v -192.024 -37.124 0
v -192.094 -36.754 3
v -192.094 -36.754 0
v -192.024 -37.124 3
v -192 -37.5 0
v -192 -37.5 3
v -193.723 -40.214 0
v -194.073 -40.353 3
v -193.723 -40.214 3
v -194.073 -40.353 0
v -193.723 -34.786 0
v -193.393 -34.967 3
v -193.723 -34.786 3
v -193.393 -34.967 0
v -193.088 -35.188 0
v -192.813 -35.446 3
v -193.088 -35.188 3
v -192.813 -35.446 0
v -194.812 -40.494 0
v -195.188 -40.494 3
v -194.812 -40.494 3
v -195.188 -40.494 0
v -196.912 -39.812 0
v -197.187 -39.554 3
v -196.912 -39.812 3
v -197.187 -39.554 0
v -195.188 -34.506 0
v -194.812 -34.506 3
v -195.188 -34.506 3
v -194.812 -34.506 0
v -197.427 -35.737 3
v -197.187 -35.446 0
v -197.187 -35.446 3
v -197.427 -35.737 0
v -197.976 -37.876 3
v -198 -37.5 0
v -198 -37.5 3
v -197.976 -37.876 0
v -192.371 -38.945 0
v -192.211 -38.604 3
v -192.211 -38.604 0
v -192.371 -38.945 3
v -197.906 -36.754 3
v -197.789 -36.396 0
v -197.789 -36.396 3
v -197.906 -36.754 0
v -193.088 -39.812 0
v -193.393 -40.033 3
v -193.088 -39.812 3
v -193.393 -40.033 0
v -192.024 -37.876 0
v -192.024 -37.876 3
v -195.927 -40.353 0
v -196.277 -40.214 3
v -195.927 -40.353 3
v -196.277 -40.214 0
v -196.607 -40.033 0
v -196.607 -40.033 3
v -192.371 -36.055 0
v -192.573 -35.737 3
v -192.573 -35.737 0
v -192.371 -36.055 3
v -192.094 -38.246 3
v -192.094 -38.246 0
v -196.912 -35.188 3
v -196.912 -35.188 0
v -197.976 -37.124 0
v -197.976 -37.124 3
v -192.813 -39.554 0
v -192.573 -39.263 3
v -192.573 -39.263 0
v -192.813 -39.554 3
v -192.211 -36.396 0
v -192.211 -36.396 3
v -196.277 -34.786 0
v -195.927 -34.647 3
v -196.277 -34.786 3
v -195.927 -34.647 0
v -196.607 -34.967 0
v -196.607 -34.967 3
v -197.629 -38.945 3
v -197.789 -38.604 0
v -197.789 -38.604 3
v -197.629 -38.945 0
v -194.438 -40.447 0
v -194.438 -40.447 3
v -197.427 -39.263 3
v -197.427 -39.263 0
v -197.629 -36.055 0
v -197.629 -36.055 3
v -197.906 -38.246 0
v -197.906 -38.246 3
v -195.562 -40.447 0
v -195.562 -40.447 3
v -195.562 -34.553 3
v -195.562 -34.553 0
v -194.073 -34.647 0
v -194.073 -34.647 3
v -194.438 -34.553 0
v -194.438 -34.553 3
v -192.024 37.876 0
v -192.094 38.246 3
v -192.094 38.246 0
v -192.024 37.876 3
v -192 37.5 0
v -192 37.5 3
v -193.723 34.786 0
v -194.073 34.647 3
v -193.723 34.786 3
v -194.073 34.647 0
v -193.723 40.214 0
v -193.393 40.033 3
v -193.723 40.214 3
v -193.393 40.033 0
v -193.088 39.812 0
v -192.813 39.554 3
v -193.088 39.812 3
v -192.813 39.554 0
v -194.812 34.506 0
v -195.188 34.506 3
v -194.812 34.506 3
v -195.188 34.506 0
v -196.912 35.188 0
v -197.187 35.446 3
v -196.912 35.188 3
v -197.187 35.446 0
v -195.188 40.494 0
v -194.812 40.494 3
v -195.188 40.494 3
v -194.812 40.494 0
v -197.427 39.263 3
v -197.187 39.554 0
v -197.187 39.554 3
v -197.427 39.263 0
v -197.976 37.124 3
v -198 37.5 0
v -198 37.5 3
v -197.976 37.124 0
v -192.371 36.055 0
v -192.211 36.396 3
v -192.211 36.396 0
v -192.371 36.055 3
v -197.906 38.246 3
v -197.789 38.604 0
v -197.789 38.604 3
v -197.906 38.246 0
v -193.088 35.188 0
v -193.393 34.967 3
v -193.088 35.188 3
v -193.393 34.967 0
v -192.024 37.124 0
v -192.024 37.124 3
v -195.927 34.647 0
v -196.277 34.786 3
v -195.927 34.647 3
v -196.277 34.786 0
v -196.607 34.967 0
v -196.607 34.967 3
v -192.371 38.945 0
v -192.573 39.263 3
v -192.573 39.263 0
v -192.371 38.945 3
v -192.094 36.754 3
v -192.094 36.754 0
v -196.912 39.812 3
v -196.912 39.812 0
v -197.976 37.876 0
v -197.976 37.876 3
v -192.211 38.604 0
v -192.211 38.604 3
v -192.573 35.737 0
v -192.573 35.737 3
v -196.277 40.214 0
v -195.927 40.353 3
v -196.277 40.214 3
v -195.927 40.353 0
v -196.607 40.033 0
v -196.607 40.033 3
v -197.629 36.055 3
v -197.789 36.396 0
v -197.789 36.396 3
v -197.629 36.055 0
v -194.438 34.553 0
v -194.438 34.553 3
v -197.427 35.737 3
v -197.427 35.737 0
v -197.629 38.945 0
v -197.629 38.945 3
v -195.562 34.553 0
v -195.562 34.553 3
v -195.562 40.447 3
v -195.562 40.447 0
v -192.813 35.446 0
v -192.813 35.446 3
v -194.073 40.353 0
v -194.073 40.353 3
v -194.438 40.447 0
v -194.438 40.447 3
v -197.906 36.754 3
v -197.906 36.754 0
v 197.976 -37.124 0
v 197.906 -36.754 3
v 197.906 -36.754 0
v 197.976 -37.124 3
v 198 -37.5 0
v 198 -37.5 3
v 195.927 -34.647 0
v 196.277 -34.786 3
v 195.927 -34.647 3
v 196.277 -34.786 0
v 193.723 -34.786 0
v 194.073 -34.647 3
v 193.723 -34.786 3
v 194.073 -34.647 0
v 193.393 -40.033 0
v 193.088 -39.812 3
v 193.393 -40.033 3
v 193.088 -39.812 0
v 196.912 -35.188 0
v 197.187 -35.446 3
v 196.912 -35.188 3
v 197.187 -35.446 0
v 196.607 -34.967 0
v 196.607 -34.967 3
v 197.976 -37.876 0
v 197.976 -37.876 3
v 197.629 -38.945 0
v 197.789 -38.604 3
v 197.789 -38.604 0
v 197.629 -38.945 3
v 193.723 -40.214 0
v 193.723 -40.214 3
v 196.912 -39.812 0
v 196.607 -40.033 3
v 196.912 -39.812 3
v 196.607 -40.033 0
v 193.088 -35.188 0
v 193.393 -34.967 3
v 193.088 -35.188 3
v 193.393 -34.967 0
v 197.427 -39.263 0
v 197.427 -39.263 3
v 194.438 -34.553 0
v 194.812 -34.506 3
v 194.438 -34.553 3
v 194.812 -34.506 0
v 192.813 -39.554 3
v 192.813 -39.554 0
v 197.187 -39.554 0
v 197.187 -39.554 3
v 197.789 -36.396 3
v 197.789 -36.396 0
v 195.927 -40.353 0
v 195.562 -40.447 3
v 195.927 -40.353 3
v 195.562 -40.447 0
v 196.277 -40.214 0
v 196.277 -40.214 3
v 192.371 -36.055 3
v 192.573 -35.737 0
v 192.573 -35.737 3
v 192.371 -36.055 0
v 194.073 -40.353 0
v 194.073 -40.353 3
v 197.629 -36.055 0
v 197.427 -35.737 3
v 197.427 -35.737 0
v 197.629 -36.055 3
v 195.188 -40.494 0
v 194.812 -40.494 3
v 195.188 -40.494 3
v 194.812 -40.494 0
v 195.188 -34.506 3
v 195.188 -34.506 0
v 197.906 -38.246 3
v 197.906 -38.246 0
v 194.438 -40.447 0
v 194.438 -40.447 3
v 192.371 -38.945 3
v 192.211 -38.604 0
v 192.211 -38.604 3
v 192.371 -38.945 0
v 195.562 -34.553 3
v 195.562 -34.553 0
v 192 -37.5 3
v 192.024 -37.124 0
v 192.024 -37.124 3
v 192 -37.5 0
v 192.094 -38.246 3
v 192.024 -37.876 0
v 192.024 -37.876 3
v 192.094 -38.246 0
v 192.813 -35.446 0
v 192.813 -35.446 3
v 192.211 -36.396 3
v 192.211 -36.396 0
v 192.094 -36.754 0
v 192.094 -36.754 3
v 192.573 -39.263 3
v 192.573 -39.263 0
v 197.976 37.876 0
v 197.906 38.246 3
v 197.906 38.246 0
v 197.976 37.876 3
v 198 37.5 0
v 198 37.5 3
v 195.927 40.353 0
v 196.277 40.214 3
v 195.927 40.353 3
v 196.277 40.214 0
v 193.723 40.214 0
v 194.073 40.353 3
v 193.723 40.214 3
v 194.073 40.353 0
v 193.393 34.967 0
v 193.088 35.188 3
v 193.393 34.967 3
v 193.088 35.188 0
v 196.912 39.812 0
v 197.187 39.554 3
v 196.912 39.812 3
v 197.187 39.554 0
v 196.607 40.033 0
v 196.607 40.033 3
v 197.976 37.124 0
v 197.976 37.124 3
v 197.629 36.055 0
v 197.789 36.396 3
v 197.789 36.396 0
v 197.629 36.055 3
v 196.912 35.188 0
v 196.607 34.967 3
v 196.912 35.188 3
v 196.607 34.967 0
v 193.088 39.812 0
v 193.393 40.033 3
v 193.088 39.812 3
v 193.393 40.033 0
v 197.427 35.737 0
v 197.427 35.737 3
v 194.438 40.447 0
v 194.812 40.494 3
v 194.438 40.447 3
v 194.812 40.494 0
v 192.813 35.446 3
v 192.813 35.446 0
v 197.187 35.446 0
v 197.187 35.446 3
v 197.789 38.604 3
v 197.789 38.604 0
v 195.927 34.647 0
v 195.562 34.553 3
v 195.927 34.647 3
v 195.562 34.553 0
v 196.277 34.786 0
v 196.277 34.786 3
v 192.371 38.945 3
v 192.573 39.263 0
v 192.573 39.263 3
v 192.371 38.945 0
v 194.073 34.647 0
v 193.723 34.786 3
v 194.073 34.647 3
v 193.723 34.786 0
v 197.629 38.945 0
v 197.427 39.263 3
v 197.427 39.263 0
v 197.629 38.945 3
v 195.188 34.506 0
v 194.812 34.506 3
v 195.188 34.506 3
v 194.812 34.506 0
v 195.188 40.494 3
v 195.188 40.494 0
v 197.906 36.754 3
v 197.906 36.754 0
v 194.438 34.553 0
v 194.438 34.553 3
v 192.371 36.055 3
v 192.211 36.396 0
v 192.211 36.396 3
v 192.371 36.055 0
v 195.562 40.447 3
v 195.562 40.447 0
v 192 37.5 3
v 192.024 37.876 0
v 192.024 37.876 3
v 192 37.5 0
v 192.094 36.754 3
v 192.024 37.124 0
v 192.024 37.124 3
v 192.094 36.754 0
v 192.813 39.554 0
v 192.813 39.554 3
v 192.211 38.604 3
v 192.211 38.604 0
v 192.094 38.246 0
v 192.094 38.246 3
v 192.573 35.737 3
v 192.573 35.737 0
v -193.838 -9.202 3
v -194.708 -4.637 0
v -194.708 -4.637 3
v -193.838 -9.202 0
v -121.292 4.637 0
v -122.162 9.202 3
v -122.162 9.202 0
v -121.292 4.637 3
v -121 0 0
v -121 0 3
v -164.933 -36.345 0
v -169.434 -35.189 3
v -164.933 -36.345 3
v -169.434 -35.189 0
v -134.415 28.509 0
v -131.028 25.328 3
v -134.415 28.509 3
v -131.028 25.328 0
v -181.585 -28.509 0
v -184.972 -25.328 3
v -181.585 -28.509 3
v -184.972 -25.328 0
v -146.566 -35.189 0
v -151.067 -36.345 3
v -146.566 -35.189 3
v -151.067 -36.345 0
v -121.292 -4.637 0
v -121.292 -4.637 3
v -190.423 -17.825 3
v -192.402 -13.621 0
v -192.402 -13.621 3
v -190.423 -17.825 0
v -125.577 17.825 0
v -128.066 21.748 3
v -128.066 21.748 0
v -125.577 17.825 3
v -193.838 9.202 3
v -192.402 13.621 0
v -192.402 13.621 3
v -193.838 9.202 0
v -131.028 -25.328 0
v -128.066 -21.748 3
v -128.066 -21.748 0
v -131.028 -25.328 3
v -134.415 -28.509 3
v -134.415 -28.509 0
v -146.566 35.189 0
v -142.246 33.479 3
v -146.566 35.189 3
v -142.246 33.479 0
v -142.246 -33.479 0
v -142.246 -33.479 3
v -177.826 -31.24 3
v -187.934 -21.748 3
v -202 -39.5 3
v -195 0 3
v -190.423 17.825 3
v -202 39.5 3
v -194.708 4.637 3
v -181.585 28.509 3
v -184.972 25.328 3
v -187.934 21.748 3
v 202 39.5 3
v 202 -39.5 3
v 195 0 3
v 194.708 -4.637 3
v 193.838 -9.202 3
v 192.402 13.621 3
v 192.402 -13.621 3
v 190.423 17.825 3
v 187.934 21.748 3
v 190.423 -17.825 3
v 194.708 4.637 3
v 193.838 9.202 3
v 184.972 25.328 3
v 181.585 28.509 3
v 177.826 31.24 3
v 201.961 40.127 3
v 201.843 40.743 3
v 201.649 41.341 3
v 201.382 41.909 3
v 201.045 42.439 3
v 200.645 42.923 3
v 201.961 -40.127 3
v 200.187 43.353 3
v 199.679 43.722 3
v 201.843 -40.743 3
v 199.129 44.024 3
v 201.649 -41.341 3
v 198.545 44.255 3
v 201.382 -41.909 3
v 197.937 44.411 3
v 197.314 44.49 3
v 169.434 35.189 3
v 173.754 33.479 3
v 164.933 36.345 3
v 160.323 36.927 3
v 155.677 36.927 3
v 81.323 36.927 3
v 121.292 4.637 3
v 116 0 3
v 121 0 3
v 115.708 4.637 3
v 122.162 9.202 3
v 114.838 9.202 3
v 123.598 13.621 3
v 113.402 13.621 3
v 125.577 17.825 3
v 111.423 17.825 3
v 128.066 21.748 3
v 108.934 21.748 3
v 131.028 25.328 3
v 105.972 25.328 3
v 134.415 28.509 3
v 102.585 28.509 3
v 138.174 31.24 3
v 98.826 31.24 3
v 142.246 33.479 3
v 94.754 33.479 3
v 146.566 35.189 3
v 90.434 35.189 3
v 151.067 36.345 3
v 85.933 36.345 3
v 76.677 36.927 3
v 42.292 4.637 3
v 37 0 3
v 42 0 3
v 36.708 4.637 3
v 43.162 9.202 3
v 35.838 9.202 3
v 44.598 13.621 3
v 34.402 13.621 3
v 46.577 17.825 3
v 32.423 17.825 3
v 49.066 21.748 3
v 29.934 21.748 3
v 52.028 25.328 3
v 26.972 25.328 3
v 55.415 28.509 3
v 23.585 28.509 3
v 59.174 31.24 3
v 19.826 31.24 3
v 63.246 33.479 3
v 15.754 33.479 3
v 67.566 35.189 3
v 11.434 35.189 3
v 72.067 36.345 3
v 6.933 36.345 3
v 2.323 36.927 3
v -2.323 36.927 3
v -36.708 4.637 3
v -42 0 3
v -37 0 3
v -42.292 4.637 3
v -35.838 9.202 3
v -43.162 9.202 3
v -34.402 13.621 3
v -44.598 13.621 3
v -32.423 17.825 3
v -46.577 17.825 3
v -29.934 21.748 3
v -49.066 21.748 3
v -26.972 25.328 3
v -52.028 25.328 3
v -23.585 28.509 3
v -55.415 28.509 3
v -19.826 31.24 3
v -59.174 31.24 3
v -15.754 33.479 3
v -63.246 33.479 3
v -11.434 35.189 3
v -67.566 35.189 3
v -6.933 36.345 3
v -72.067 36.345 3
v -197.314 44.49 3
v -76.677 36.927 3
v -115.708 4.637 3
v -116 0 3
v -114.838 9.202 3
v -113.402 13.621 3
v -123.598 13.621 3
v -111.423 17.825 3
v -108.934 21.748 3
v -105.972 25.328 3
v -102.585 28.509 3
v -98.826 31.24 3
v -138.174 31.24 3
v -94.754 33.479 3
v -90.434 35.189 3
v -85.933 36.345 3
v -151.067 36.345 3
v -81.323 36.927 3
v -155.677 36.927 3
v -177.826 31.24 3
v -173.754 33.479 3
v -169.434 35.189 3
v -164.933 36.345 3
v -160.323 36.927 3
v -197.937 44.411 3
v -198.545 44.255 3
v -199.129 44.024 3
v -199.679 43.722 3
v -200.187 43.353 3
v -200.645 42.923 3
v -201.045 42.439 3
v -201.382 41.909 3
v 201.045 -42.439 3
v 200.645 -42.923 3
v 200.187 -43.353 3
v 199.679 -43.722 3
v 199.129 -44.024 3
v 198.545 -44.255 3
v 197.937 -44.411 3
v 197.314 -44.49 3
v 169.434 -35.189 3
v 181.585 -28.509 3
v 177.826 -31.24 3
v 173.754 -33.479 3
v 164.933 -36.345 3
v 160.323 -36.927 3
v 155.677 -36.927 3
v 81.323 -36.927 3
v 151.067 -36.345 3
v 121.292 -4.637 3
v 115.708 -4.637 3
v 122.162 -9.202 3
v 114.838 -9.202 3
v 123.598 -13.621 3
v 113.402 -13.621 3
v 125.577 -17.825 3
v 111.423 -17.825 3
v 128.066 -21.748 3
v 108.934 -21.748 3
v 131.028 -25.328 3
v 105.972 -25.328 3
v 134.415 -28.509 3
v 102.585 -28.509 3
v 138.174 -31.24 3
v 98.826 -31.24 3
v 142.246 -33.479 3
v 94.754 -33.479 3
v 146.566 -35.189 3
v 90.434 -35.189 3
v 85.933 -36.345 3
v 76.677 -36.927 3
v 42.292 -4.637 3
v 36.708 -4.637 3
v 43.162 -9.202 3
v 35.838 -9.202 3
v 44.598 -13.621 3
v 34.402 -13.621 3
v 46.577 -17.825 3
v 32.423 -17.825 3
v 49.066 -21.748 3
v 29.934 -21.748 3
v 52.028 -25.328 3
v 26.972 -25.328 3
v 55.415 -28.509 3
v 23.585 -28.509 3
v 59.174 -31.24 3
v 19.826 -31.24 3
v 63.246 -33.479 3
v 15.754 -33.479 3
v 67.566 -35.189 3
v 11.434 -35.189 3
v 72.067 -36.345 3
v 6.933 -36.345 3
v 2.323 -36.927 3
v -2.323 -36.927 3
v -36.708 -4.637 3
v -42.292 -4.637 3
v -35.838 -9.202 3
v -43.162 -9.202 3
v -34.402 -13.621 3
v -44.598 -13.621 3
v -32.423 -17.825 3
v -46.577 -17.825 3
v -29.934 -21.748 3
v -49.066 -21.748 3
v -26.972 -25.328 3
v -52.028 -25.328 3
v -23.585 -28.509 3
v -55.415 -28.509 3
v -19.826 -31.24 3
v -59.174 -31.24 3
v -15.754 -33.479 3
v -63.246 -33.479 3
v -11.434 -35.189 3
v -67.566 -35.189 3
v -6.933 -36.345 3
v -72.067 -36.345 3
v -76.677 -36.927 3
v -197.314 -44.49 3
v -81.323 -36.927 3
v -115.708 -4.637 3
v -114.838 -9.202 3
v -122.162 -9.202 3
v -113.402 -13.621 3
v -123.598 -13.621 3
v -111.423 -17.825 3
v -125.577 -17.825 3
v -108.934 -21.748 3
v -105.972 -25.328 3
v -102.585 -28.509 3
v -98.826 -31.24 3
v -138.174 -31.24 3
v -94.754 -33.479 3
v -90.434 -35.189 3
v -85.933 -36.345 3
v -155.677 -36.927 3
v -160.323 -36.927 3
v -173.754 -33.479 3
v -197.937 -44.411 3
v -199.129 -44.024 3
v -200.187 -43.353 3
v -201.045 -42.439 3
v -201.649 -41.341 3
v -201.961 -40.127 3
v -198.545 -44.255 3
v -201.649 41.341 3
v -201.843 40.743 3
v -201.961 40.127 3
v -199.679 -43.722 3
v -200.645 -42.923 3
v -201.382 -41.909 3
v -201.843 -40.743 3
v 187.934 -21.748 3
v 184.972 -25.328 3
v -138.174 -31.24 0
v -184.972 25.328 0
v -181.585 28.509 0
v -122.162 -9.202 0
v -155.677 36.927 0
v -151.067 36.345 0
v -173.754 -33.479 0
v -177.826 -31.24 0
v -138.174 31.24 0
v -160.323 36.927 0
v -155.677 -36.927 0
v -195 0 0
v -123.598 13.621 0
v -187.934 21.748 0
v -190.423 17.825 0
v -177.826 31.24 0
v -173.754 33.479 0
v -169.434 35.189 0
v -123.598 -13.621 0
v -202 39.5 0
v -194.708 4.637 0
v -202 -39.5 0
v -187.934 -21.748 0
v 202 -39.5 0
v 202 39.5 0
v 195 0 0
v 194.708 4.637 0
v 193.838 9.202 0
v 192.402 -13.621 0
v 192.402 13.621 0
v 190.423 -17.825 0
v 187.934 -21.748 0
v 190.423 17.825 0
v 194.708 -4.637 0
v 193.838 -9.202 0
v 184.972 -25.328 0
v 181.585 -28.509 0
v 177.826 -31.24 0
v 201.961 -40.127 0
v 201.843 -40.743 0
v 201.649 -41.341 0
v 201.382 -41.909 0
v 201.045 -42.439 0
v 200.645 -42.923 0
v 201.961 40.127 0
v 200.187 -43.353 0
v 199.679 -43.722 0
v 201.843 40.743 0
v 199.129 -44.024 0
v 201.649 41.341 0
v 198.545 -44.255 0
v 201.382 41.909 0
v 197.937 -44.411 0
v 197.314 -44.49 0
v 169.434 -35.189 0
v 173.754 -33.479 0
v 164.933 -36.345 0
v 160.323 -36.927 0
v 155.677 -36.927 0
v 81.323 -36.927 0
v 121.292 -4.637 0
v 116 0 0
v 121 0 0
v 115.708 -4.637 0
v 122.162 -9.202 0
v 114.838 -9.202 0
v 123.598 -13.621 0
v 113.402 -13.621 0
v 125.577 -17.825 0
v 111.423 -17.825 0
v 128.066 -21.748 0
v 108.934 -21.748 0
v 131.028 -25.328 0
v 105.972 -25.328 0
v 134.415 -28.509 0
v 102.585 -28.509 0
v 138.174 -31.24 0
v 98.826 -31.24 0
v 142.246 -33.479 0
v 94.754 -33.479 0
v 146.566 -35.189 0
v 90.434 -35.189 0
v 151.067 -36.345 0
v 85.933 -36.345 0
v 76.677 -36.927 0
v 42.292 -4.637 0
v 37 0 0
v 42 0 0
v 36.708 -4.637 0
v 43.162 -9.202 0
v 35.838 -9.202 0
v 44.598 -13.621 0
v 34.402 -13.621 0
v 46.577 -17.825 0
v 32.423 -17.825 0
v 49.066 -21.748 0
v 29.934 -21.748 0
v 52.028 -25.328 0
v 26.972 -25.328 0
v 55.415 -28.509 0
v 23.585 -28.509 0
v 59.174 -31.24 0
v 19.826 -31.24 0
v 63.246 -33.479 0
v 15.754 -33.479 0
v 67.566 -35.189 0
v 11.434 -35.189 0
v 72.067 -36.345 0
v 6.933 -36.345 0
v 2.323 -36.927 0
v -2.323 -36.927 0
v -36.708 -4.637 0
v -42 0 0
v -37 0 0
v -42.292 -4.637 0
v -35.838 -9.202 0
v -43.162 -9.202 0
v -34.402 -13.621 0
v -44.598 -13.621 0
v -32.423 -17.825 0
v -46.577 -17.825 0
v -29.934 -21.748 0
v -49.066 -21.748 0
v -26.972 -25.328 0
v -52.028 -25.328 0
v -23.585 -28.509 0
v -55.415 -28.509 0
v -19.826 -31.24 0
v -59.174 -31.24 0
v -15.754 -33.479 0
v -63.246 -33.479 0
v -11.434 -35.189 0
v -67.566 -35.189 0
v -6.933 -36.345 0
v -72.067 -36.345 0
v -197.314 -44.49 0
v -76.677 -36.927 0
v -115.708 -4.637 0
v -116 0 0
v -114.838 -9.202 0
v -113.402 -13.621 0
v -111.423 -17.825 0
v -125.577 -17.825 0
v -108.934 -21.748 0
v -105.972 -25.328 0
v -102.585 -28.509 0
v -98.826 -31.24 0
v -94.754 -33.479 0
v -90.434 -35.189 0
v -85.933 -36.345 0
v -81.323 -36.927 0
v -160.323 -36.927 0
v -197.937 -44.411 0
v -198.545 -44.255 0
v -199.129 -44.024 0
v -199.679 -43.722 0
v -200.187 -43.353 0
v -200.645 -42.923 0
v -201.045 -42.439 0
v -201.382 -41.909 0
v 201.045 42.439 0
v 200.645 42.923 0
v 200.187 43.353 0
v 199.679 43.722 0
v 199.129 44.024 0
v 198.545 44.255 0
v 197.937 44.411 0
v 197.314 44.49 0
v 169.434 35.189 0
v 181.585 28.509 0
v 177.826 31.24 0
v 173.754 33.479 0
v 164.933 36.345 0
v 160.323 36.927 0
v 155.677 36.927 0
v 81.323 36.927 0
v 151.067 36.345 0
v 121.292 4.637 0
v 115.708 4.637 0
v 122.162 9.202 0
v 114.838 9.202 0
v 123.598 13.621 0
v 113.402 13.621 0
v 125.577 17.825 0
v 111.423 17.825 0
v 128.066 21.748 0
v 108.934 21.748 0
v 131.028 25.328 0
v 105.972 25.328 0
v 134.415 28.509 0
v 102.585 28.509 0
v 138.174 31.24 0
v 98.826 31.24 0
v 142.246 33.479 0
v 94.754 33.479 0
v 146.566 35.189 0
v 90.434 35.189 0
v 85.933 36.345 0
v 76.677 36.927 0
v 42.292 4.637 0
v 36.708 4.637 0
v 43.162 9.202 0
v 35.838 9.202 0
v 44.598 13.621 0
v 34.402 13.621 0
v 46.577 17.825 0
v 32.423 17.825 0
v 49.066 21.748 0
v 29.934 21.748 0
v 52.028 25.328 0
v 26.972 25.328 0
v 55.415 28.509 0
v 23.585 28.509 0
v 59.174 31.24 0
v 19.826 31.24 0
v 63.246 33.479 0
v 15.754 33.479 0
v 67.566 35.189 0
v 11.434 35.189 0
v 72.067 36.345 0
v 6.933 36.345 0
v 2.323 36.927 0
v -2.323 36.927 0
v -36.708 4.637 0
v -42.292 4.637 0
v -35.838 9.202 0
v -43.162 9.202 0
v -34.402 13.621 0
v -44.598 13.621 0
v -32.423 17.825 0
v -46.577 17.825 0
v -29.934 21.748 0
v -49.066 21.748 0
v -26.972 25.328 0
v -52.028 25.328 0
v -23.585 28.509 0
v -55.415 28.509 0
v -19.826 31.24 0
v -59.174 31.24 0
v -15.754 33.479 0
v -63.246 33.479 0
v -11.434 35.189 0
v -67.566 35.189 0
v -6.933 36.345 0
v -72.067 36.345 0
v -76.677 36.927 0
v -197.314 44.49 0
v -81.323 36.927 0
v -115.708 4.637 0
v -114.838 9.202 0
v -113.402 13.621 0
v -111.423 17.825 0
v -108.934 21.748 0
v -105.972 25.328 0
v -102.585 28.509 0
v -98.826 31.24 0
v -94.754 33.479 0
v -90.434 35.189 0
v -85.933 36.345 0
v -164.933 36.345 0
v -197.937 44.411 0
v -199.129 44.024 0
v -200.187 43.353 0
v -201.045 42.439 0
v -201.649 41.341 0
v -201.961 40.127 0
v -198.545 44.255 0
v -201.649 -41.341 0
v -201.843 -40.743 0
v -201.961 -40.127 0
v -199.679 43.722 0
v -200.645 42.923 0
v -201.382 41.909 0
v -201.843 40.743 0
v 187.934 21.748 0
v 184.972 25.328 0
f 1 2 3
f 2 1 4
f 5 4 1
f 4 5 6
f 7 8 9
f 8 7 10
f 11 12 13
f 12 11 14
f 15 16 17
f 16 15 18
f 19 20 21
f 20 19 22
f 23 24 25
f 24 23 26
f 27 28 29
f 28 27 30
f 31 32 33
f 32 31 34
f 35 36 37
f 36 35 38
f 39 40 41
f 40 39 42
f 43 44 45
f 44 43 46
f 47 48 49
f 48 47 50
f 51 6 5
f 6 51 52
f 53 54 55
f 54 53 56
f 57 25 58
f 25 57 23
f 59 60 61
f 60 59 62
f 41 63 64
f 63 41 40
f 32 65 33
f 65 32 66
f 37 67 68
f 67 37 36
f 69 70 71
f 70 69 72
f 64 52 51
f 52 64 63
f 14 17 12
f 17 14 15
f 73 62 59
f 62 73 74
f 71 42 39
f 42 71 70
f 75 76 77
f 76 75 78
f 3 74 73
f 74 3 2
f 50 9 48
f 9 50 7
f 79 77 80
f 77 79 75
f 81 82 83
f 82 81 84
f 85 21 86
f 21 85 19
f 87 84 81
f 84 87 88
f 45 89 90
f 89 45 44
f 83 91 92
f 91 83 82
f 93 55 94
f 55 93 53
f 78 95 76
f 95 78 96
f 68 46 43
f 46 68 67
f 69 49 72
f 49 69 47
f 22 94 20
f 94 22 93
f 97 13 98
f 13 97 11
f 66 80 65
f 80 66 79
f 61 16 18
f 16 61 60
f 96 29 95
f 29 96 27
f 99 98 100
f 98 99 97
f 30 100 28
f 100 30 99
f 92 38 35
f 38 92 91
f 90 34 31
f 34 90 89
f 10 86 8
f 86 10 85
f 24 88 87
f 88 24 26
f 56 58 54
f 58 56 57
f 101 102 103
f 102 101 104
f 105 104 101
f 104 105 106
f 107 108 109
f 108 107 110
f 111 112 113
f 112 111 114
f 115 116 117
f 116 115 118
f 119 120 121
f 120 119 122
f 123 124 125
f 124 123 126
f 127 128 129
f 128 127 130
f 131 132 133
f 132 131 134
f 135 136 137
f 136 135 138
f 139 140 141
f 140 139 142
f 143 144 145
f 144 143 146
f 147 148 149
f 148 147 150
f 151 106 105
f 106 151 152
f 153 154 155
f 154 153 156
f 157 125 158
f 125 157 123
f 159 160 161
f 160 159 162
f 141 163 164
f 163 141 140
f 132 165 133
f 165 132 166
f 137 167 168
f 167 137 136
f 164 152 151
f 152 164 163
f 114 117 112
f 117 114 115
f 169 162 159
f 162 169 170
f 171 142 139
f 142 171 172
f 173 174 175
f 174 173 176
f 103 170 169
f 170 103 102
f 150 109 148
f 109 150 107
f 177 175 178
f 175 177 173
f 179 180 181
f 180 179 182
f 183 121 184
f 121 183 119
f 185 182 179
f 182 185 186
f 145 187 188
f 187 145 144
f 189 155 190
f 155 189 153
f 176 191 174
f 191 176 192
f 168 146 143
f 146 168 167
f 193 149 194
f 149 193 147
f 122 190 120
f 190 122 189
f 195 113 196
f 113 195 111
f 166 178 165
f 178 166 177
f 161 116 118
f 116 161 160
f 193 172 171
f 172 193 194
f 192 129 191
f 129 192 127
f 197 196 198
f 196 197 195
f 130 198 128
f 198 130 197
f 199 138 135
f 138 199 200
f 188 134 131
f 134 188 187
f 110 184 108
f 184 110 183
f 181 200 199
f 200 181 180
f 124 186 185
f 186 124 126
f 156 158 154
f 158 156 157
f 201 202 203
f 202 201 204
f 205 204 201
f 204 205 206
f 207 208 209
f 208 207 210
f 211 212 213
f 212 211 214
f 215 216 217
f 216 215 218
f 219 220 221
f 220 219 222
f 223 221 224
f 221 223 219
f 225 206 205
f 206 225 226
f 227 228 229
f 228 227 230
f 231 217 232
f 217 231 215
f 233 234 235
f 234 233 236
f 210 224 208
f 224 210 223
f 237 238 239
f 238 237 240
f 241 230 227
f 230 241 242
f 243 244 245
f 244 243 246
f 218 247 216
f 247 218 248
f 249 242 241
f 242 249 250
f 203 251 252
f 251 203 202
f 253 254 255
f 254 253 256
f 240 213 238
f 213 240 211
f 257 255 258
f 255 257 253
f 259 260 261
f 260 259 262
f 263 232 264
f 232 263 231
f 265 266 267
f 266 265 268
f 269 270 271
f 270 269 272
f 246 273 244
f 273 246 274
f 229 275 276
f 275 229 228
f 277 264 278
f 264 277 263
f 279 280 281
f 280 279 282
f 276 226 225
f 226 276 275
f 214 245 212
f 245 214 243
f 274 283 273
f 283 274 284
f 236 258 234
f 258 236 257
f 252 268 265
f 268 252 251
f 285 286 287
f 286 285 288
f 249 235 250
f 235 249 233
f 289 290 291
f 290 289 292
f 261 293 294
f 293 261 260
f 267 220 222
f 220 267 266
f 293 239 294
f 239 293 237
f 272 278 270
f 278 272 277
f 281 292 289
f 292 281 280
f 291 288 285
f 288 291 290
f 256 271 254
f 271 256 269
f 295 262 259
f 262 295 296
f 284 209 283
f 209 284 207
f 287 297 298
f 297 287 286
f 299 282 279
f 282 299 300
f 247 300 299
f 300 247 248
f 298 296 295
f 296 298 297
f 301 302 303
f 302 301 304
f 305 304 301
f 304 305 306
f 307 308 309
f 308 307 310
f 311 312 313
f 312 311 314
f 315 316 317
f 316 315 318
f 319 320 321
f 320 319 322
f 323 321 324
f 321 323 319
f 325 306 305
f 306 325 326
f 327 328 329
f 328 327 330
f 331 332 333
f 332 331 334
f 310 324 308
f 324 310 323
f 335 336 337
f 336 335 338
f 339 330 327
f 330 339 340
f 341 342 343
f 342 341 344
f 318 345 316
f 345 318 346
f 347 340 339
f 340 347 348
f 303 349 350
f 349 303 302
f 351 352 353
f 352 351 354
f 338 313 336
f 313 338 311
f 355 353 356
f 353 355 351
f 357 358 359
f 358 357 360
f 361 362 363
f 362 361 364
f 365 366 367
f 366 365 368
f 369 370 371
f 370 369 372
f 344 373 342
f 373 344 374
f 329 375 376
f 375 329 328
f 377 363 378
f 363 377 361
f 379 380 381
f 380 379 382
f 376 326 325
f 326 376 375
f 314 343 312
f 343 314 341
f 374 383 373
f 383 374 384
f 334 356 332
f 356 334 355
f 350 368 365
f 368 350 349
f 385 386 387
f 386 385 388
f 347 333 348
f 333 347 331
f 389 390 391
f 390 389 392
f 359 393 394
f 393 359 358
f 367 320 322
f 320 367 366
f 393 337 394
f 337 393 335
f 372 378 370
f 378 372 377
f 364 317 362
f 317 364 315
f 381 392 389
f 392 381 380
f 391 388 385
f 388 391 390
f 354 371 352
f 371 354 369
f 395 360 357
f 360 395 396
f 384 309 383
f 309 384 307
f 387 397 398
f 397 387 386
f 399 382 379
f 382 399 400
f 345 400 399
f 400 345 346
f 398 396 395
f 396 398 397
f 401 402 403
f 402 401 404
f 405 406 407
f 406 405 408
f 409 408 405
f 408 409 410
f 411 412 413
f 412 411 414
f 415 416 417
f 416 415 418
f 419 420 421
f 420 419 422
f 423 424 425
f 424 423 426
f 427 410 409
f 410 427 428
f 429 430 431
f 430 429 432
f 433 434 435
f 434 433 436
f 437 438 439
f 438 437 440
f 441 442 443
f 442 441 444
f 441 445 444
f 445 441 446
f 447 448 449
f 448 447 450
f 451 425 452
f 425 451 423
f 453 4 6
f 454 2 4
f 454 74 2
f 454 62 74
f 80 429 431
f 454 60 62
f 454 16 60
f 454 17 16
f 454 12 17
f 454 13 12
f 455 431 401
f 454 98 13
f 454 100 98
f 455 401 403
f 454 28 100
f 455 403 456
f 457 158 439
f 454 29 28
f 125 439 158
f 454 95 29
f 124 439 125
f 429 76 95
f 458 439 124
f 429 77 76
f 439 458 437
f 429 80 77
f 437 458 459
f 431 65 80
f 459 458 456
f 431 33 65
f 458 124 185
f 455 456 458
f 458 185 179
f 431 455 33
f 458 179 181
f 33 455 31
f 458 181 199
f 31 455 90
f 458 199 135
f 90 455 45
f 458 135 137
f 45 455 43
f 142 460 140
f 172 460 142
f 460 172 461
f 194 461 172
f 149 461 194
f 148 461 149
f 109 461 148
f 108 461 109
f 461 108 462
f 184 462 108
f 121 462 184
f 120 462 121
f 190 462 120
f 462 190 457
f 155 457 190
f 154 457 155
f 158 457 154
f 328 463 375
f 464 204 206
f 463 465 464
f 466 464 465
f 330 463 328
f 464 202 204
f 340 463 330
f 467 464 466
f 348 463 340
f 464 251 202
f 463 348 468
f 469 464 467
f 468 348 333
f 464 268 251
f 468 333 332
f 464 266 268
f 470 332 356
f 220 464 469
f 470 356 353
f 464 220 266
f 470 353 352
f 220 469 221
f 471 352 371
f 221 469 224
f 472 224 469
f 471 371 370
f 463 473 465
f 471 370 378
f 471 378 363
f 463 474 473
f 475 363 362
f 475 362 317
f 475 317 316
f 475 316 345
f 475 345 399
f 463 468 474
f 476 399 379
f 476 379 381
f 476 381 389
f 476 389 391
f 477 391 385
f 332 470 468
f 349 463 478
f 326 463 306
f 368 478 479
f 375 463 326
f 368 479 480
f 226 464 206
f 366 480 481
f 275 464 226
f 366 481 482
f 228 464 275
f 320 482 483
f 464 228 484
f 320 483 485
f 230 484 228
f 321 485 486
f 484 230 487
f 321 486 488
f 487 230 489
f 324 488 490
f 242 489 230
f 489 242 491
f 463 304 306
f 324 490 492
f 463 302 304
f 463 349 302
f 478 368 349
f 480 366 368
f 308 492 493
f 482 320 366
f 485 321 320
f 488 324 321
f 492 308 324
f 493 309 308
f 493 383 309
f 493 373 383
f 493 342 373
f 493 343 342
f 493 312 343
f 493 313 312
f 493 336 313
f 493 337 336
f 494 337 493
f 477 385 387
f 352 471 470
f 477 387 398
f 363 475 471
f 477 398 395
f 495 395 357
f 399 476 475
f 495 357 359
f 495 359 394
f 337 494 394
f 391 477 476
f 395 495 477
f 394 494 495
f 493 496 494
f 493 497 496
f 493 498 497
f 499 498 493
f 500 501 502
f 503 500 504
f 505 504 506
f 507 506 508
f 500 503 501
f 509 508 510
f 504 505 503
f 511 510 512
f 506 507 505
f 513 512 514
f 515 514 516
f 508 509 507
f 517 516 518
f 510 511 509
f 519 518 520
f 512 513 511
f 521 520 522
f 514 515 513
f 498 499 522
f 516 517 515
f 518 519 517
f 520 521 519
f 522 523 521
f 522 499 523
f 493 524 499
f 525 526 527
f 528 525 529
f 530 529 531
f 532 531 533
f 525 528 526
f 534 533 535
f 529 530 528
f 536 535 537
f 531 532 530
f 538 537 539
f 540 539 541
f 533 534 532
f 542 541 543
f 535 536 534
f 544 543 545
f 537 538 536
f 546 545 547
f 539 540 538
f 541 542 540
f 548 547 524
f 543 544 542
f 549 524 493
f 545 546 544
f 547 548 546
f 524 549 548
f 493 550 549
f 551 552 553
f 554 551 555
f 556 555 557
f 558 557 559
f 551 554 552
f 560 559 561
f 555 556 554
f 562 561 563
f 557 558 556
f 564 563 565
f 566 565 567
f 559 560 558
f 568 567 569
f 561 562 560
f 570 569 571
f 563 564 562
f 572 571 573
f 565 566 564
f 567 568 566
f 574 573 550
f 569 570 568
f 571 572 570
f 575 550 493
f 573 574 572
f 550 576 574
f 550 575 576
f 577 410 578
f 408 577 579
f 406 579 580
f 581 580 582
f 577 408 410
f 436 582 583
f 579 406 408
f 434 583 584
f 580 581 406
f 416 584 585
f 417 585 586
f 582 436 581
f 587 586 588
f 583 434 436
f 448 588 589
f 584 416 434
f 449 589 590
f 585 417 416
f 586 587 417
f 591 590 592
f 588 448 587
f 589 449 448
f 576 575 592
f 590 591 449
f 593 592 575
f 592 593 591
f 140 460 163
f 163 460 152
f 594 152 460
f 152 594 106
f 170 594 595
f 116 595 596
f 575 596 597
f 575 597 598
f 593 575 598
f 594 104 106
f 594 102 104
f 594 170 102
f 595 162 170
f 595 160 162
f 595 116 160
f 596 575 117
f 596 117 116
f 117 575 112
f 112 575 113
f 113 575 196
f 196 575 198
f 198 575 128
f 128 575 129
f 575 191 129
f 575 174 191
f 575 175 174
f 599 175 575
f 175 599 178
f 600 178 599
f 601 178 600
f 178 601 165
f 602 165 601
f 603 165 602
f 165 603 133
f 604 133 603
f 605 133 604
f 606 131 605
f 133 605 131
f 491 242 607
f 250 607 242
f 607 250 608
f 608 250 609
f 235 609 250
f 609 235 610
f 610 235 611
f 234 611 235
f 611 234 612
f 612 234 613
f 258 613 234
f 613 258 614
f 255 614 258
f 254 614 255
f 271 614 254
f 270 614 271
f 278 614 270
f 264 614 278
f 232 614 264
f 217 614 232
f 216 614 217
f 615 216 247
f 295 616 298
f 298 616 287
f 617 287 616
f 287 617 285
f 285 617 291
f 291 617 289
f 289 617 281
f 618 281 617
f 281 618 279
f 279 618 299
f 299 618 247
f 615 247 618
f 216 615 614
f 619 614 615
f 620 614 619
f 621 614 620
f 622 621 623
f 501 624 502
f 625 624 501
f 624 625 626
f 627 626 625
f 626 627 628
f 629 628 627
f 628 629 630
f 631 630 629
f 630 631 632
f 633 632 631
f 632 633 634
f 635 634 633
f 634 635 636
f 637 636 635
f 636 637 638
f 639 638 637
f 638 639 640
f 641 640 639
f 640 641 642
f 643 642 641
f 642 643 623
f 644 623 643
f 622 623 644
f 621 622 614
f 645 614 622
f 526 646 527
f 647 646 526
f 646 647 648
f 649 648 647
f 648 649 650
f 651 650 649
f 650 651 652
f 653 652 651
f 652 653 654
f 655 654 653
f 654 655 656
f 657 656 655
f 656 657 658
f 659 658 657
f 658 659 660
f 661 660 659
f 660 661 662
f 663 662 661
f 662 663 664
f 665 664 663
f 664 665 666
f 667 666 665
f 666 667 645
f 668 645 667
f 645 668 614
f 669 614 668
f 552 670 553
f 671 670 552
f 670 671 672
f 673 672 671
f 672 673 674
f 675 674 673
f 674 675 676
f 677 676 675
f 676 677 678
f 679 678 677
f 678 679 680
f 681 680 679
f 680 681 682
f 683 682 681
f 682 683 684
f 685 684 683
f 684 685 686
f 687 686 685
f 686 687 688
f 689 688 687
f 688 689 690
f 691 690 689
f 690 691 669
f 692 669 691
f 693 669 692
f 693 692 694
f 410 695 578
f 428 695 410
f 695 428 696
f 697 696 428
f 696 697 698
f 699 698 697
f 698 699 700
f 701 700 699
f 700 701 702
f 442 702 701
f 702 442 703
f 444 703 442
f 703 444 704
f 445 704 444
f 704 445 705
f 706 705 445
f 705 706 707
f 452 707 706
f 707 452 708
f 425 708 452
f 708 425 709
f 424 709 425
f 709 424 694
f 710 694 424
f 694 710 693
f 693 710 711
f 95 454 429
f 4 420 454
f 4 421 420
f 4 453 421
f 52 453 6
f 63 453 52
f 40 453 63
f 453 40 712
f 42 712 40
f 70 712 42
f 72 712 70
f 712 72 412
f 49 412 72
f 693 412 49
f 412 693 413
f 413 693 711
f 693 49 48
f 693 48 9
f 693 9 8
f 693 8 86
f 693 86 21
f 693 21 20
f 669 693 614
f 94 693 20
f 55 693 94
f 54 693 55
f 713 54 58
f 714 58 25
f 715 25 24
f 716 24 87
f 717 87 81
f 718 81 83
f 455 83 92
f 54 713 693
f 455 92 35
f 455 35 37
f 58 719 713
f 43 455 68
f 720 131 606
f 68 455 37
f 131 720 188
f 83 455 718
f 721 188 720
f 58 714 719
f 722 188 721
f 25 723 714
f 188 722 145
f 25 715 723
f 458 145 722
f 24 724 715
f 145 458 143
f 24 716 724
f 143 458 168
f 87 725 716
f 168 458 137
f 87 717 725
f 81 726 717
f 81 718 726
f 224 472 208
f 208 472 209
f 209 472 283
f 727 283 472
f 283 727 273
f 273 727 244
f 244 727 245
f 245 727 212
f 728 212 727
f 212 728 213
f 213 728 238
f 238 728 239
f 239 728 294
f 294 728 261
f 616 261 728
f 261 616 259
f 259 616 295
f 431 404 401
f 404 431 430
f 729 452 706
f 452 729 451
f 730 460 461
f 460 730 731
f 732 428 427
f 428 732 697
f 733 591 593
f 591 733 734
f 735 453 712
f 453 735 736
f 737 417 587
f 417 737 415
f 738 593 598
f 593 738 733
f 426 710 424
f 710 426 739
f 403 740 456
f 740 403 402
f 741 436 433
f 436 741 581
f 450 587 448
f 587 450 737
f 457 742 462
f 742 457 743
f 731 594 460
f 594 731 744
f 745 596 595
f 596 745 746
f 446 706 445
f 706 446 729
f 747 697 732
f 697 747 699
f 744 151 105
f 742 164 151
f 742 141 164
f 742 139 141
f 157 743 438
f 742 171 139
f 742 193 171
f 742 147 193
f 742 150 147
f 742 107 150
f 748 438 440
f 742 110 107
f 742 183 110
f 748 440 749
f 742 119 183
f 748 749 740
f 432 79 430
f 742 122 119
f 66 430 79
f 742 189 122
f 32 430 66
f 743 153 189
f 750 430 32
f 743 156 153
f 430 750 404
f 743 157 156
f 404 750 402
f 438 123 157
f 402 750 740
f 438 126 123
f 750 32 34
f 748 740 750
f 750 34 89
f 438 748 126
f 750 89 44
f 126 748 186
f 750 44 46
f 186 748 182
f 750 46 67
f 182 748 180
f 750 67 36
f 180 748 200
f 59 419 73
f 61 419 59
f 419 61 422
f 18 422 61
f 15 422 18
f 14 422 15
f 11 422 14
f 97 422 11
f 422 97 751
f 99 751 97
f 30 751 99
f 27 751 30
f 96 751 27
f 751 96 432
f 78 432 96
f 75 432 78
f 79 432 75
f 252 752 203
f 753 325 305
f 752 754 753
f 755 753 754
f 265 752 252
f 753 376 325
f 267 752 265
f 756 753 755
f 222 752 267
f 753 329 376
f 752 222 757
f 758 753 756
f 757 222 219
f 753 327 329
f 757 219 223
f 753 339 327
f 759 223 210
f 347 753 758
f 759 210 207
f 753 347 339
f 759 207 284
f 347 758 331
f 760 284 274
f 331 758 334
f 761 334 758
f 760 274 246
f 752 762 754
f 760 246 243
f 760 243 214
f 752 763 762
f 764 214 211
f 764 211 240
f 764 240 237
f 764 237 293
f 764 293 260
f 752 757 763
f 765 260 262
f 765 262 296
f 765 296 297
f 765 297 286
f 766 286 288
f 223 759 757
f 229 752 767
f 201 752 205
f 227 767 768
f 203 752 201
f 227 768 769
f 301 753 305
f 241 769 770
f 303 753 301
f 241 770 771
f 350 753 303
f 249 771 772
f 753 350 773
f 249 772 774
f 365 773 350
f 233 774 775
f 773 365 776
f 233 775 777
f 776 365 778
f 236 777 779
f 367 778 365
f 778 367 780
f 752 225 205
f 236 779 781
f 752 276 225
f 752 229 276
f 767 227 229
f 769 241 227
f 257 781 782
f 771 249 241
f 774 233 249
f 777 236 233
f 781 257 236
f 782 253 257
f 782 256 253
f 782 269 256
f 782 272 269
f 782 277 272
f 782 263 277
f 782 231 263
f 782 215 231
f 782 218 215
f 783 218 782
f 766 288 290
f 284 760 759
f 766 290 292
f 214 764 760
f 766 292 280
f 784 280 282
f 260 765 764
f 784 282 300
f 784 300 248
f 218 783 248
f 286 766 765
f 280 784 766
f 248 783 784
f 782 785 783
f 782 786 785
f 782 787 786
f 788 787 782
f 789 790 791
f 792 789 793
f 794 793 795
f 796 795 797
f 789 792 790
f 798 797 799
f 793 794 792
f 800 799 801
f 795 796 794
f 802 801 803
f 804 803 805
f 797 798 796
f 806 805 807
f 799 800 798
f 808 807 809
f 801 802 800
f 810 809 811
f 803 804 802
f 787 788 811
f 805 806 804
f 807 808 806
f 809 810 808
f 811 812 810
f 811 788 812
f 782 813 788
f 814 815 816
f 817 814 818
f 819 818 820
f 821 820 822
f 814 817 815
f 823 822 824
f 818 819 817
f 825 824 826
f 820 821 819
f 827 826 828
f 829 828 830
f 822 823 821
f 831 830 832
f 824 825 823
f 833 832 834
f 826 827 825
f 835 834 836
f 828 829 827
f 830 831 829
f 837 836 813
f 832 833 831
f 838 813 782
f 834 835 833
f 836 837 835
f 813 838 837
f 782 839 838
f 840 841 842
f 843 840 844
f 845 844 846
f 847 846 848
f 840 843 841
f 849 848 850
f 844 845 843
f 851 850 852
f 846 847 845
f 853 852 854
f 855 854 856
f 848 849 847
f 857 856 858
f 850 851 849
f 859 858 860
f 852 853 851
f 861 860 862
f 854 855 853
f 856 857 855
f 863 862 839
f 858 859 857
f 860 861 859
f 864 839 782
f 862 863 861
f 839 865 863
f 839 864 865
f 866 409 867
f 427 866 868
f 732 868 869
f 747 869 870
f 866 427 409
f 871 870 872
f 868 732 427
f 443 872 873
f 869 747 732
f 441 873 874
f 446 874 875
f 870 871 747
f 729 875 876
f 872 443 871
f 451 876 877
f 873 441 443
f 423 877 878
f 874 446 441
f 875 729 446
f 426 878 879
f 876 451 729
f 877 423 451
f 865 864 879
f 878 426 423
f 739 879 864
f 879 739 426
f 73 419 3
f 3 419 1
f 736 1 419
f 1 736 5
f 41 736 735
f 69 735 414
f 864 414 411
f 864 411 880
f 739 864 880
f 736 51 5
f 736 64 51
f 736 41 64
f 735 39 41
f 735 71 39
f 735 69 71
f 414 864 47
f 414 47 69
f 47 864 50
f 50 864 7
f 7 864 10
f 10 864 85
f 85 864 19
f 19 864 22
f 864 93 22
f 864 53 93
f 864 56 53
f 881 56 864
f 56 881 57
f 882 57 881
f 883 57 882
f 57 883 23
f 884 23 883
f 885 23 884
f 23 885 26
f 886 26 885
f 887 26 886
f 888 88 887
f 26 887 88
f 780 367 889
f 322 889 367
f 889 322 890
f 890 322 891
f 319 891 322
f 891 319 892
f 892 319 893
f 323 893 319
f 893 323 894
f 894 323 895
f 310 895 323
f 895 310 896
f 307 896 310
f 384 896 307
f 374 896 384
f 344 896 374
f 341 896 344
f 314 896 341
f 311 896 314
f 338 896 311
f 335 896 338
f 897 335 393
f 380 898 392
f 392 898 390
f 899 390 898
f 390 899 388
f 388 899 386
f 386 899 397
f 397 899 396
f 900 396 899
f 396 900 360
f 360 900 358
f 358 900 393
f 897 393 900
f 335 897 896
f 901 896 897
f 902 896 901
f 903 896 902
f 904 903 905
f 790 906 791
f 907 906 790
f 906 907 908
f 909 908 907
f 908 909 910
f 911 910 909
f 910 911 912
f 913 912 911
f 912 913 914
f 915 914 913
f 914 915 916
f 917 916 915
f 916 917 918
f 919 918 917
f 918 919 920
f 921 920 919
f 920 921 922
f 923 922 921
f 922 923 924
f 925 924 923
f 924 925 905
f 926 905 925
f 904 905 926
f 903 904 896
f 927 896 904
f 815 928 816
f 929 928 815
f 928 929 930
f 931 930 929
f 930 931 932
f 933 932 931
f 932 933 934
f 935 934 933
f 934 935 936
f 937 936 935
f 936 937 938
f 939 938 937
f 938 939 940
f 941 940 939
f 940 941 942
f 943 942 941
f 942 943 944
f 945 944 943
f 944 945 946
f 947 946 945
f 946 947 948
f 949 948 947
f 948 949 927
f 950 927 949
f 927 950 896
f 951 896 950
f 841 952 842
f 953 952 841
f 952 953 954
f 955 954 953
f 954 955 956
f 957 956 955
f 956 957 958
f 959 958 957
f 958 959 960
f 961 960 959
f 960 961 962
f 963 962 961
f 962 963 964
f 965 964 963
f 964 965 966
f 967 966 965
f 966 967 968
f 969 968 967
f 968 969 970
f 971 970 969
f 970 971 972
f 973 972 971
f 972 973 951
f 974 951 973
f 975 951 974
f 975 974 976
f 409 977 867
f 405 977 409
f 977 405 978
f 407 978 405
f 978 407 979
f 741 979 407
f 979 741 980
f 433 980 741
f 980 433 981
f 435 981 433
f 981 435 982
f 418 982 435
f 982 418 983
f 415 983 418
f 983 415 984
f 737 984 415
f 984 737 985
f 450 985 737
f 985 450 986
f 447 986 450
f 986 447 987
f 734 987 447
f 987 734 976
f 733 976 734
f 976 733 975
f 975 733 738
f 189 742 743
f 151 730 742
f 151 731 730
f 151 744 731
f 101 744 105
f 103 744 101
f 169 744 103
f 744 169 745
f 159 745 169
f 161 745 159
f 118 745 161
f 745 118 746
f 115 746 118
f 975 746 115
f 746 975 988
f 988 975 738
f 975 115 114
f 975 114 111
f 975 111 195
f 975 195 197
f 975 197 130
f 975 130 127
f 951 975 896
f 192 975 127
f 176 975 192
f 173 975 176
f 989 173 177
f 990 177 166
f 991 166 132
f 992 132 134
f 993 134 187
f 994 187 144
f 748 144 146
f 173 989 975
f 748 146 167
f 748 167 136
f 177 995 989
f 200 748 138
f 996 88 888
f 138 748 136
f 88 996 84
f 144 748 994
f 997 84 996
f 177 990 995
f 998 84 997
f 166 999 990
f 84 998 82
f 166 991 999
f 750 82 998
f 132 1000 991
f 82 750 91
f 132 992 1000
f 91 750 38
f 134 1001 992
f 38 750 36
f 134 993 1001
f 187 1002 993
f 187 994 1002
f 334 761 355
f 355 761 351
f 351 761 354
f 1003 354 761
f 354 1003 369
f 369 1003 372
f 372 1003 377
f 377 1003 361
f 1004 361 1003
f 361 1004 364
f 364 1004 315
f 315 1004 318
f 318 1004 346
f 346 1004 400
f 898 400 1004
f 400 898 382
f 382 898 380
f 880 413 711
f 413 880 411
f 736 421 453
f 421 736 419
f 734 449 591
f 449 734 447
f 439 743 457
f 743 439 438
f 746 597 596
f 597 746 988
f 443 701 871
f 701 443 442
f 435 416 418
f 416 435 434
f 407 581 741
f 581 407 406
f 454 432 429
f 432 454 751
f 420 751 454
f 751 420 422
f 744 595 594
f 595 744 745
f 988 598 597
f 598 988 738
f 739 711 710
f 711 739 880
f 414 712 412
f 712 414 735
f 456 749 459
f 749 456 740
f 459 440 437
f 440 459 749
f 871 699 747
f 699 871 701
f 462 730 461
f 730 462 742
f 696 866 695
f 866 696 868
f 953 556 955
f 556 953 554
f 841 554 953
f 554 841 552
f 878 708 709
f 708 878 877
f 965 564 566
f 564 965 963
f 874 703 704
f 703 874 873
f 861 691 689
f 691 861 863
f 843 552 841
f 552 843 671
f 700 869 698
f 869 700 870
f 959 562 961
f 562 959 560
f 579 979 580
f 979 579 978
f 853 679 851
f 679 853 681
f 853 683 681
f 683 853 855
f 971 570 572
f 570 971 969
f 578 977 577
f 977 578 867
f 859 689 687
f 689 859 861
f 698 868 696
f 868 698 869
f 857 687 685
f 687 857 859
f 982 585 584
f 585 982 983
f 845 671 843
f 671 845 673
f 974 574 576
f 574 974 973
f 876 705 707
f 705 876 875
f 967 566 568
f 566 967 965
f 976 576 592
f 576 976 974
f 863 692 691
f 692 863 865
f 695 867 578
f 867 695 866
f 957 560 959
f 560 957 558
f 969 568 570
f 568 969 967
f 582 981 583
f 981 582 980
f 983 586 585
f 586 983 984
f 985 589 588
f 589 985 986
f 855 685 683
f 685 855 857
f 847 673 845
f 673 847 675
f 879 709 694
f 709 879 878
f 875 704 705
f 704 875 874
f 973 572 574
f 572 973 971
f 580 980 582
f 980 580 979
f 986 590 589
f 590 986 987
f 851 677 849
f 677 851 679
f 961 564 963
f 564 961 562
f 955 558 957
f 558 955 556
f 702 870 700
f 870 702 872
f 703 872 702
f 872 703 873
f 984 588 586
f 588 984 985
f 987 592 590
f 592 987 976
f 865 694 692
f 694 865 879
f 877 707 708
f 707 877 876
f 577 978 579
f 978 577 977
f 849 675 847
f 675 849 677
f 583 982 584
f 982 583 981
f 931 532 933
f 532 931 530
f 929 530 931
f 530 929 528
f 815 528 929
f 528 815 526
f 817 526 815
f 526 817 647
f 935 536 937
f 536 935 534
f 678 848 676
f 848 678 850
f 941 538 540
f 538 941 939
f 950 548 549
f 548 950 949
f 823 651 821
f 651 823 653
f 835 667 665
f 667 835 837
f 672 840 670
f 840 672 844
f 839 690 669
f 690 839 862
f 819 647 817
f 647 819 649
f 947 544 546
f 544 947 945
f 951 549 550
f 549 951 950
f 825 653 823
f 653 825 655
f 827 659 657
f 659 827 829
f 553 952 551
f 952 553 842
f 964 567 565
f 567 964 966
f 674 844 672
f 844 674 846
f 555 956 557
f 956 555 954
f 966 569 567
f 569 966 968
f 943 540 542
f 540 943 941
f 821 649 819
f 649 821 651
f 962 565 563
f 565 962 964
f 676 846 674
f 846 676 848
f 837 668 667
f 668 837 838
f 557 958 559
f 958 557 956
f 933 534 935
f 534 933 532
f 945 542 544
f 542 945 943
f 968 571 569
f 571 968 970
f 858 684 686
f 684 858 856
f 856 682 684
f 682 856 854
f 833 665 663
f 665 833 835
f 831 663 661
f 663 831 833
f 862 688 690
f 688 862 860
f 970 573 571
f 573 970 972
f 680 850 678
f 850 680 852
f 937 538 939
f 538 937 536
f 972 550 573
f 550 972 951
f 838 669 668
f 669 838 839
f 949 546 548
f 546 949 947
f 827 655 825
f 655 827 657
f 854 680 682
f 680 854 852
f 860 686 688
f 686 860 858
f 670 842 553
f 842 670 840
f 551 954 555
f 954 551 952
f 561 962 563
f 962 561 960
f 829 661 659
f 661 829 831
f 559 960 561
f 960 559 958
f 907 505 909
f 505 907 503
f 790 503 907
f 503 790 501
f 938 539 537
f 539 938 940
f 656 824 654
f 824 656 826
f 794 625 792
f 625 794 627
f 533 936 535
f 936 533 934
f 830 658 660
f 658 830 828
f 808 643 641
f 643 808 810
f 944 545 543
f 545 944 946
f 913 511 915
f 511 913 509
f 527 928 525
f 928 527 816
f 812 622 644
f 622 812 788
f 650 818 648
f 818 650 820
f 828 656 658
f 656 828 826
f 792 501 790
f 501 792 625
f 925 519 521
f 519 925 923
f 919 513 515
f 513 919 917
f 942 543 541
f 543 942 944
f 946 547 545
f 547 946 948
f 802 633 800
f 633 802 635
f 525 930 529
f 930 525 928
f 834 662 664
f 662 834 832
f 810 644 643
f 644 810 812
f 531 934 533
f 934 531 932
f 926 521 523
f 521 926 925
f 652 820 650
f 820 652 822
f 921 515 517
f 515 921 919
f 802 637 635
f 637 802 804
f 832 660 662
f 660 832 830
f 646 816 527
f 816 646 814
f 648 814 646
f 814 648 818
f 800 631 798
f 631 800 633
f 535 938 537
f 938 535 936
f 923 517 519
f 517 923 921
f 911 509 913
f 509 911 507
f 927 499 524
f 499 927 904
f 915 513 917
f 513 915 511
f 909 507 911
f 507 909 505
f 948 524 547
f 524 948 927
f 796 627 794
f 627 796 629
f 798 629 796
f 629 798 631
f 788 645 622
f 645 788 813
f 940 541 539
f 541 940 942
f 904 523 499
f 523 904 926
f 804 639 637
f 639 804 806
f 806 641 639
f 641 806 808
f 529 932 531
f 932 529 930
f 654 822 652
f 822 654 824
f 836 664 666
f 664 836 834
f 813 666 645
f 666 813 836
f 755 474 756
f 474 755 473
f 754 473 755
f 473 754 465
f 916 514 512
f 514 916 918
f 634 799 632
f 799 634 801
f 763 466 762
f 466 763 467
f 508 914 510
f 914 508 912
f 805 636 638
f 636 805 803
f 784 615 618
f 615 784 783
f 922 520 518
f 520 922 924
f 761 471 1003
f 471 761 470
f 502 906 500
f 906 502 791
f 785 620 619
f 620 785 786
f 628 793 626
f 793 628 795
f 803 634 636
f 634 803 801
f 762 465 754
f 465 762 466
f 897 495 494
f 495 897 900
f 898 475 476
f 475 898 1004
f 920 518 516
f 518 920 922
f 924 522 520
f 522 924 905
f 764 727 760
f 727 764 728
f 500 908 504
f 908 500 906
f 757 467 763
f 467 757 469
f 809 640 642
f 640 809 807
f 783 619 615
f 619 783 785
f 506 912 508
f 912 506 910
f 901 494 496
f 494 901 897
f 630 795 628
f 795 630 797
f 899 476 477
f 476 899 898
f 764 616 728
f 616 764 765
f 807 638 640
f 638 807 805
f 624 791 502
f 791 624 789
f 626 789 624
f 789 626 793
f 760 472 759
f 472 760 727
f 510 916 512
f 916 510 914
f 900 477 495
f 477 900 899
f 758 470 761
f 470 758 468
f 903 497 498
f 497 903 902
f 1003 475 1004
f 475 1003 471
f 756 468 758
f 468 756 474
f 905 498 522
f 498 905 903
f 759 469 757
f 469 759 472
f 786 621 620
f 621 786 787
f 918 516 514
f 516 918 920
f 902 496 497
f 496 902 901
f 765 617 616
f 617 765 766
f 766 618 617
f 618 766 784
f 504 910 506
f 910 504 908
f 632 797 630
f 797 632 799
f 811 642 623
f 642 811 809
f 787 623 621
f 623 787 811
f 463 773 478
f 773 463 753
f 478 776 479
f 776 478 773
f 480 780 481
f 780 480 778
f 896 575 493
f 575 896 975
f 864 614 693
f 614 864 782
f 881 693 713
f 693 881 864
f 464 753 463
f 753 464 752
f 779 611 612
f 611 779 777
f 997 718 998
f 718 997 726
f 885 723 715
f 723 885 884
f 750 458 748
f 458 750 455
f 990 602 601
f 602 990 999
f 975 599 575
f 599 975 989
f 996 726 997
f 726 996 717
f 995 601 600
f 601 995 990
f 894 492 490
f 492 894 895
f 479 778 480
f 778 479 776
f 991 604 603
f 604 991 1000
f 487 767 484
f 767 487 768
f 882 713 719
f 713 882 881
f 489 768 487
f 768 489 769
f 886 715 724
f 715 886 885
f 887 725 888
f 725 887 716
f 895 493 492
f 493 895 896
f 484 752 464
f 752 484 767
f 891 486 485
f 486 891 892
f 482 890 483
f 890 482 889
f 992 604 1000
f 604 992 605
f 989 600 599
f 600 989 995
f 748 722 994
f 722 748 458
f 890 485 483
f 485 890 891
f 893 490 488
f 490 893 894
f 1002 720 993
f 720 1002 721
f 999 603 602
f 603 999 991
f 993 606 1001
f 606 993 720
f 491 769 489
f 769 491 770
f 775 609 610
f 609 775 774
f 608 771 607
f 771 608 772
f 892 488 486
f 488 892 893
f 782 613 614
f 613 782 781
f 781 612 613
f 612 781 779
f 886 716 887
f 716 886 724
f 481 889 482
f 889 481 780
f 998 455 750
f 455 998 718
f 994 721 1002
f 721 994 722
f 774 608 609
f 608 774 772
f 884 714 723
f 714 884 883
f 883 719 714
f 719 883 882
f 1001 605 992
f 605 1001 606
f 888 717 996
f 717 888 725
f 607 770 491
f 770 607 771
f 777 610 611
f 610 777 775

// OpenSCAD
$fn = 50;


difference() {
	union() {
		hull() {
			translate(v = [-197.0000000000, 39.5000000000, 0]) {
				cylinder(h = 3, r = 5);
			}
			translate(v = [197.0000000000, 39.5000000000, 0]) {
				cylinder(h = 3, r = 5);
			}
			translate(v = [-197.0000000000, -39.5000000000, 0]) {
				cylinder(h = 3, r = 5);
			}
			translate(v = [197.0000000000, -39.5000000000, 0]) {
				cylinder(h = 3, r = 5);
			}
		}
	}
	union() {
		#translate(v = [-195.0000000000, -37.5000000000, -100.0000000000]) {
			cylinder(h = 200, r = 3.0000000000);
		}
		#translate(v = [-195.0000000000, 37.5000000000, -100.0000000000]) {
			cylinder(h = 200, r = 3.0000000000);
		}
		#translate(v = [195.0000000000, -37.5000000000, -100.0000000000]) {
			cylinder(h = 200, r = 3.0000000000);
		}
		#translate(v = [195.0000000000, 37.5000000000, -100.0000000000]) {
			cylinder(h = 200, r = 3.0000000000);
		}
		#translate(v = [-158.0000000000, 0, 0]) {
			cylinder(h = 3, r = 37.0000000000);
		}
		#translate(v = [-79.0000000000, 0, 0]) {
			cylinder(h = 3, r = 37.0000000000);
		}
		#cylinder(h = 3, r = 37.0000000000);
		#translate(v = [79.0000000000, 0, 0]) {
			cylinder(h = 3, r = 37.0000000000);
		}
		#translate(v = [158.0000000000, 0, 0]) {
			cylinder(h = 3, r = 37.0000000000);
		}
	}
}
